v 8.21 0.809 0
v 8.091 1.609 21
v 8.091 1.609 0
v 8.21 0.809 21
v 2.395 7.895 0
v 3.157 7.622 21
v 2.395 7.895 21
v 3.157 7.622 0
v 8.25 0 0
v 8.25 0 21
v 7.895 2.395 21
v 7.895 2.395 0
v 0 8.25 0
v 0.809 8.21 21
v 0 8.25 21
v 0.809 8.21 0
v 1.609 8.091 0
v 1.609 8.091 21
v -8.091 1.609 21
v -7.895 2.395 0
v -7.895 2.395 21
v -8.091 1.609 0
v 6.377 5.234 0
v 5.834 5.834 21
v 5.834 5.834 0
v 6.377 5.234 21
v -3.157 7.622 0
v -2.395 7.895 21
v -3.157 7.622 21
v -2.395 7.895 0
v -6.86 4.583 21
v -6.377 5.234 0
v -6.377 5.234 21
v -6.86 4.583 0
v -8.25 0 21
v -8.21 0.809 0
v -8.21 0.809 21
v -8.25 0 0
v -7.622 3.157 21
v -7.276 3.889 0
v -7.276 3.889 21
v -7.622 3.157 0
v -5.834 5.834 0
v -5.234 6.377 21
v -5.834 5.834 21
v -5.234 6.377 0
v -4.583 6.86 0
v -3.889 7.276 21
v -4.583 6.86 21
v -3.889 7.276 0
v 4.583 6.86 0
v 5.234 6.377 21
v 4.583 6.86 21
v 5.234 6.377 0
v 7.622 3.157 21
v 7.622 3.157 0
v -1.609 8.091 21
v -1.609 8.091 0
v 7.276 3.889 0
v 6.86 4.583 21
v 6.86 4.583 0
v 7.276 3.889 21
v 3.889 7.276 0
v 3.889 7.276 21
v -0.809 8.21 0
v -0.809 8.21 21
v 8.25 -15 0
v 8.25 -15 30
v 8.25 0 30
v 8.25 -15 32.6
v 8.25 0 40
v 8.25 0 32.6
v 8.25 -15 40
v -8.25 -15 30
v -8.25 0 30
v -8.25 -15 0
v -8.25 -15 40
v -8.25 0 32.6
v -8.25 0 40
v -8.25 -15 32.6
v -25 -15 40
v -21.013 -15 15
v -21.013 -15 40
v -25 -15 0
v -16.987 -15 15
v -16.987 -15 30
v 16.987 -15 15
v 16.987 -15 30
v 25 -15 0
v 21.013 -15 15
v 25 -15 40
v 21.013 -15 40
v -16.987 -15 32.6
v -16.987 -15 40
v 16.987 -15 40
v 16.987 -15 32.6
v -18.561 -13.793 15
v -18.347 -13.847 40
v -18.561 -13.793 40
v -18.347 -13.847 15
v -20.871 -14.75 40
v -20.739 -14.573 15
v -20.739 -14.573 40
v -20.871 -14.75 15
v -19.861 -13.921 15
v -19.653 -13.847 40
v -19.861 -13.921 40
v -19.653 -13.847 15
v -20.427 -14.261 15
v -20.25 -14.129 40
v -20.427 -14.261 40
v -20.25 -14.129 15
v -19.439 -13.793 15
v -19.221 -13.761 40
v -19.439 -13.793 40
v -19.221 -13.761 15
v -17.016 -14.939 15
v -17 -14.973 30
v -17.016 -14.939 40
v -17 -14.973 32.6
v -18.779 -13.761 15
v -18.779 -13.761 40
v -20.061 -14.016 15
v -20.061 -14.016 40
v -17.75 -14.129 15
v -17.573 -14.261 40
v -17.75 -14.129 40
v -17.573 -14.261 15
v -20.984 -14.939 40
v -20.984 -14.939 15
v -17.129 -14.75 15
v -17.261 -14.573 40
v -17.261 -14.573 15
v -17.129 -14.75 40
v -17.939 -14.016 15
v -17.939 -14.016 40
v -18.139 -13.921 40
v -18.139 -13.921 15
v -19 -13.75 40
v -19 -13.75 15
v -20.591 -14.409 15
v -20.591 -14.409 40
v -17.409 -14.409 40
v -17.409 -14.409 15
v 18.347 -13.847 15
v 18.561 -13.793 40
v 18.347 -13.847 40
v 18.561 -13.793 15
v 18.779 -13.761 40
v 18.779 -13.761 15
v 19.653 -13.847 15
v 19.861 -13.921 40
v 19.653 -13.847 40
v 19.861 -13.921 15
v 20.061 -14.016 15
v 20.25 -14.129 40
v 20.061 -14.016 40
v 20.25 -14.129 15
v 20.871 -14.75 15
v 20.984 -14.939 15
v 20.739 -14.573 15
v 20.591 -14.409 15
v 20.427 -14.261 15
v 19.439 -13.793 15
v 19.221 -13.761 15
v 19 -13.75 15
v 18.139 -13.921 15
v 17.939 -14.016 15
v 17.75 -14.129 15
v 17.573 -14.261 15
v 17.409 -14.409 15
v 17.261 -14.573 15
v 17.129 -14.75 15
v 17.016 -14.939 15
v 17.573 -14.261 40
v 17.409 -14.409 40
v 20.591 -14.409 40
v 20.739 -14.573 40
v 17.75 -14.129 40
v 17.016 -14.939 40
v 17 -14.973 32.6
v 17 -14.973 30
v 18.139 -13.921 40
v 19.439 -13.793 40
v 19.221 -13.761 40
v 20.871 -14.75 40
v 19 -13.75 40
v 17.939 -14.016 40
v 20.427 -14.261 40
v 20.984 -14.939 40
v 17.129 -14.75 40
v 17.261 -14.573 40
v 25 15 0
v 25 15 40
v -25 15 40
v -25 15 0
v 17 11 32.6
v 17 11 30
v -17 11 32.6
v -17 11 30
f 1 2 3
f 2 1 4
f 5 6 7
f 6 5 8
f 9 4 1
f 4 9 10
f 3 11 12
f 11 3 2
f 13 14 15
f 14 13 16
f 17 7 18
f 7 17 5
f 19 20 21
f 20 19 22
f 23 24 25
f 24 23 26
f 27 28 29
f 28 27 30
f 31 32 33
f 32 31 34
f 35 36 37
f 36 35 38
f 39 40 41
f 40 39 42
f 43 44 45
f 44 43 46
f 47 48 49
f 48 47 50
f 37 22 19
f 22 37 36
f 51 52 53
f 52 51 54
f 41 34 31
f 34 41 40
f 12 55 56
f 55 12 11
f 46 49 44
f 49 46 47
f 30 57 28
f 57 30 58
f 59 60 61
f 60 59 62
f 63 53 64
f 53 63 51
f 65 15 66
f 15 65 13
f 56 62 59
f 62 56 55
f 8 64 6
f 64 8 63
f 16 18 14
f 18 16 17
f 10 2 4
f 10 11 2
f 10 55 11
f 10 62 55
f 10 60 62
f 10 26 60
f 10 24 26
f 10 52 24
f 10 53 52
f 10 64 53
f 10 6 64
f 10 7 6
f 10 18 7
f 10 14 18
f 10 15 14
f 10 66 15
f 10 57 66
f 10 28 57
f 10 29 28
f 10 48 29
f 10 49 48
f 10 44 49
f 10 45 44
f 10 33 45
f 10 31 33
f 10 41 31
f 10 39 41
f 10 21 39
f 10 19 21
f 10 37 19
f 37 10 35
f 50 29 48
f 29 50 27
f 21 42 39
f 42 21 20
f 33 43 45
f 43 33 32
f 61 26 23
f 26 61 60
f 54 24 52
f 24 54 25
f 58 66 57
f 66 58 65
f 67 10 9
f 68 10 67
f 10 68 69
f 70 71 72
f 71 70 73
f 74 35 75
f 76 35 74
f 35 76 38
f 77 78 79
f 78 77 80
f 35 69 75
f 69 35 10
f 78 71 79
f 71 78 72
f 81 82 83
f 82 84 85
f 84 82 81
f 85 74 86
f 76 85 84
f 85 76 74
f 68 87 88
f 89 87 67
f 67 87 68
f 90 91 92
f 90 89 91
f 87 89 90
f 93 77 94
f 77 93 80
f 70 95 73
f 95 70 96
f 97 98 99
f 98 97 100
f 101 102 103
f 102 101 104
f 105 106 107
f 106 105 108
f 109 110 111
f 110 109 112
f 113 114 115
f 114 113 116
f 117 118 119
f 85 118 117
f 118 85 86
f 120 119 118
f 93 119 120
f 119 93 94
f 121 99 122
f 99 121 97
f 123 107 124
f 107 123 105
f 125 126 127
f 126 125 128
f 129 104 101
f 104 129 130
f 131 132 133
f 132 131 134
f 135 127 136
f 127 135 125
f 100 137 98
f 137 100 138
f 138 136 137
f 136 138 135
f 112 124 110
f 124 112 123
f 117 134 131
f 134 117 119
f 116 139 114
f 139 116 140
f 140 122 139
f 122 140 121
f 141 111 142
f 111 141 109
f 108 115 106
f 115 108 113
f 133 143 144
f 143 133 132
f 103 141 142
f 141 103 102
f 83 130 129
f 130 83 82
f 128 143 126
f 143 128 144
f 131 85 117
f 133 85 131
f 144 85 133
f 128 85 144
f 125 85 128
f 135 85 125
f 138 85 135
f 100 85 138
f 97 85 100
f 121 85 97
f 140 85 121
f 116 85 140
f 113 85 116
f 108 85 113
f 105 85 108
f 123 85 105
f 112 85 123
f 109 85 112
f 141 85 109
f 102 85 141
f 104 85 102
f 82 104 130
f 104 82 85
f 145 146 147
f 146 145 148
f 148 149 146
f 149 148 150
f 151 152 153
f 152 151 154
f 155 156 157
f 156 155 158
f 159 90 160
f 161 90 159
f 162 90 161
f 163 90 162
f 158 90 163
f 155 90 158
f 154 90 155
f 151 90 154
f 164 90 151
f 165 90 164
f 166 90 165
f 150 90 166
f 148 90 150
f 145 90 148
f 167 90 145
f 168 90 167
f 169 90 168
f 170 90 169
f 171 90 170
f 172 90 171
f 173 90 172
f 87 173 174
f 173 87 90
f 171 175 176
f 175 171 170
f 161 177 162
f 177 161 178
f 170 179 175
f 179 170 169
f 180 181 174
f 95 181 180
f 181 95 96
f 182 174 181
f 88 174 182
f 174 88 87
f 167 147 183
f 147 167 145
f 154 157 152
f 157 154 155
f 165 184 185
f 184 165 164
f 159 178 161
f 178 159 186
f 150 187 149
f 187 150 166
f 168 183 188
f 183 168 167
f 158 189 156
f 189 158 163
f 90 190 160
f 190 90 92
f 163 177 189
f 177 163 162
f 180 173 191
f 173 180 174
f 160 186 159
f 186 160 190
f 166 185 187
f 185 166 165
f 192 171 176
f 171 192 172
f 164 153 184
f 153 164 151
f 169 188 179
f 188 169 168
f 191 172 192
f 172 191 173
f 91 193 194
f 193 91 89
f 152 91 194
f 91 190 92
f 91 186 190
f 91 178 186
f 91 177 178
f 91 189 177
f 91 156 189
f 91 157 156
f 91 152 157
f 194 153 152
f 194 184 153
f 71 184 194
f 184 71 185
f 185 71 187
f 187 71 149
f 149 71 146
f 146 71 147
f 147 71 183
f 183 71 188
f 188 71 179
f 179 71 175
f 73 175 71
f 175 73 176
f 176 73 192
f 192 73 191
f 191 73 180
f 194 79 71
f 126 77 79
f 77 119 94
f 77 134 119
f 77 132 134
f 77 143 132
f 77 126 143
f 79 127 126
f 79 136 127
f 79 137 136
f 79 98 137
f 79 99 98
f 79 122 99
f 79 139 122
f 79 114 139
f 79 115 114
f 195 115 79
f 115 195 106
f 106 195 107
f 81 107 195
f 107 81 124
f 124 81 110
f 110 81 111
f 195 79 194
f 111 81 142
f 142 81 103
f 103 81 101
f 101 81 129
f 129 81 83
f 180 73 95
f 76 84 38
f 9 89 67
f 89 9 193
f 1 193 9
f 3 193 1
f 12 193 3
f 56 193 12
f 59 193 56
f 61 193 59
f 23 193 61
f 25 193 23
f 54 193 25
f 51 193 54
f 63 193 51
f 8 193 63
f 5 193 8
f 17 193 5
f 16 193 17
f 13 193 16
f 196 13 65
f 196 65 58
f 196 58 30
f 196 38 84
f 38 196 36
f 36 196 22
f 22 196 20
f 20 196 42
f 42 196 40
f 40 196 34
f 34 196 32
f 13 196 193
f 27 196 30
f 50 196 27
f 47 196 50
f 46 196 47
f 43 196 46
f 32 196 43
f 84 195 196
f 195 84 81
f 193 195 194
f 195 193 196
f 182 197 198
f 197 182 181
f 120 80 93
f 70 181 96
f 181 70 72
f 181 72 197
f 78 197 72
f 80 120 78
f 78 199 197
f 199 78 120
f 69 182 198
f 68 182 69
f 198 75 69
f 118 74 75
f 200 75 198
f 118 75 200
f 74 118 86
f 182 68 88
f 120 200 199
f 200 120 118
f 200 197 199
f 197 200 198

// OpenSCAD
// Wall-mounted 10 mL syringe holder (tip-down, upright)
// Print orientation: rests on XY plane at z = 0, builds +Z, centred in X/Y.
// Back face (y = 15) is the wall side; syringe slides in from the front (y = -15).

// ---- Block dimensions (measured with calipers) ----
block_w = 50;   // X width
block_d = 30;   // Y depth
block_h = 40;   // Z height

// ---- Barrel channel (16.5 mm wide vertical slot, full height) ----
ch_half_w = 16.5 / 2;   // 8.25 mm half-width
ch_back_r = 8.25;       // radius of the half-circle at the back end
ch_back_cy = 0;         // centre of the back half-circle in Y (y = 0)
ch_front_y = -15;       // straight sides run forward to the front face

// ---- Finger-flange slot (cut in from the front face) ----
flange_w = 34;          // X width, centred
flange_h = 2.6;         // Z thickness (2 mm flange + clearance)
flange_z0 = 30;         // bottom of slot
flange_z1 = 32.6;       // top of slot
flange_y0 = -15;        // starts at the front face
flange_y1 = 11;         // extends back to y = 11

// ---- M4 wall-screw clearance holes (through, along Y) ----
screw_d = 4.5;          // clearance hole diameter
screw_z = 15;           // hole centre height
screw_x = [-19, 19];    // hole centre X positions

// ---- Curvature resolution ----
$fn = 64;

// =====================================================================
// 1. Base block, centred on origin in X and Y, sitting on z = 0
// =====================================================================
module block() { translate([-block_w / 2, -block_d / 2, 0])
    cube([block_w, block_d, block_h]); }

// =====================================================================
// 2. Barrel channel: half-circle (back) + rectangle (forward to front)
//    Union of the two pieces gives a smooth "D" cross-section.
//    Both pieces extend 1 mm past the top/bottom faces so the cut is
//    clean and no faces end up exactly coplanar with the block.
// =====================================================================
// 2a. Half-circle at the back (y >= 0), spanning x = -8.25 .. 8.25
module half_circle() { translate([0, ch_back_cy, 0])
    linear_extrude(height = block_h + 2, center = true)
        circle(r = ch_back_r, $fn = 64); }

// 2b. Rectangle from y = 0 back to the front face (y = -15)
module channel_rect() { translate([-ch_half_w, ch_front_y, -1])
    cube([2 * ch_half_w, -ch_front_y, block_h + 2]); }   // y: -15 .. 0

module barrel_channel() { union() {
    half_circle();
    channel_rect();
} }

// =====================================================================
// 3. Finger-flange slot: 34 mm wide, 2.6 mm tall, y = -15 .. 11
//    (extends 1 mm past the front face so the cut is not coplanar)
// =====================================================================
module flange_slot() { translate([-flange_w / 2, flange_y0 - 1, flange_z0])
    cube([flange_w, flange_y1 - flange_y0 + 1, flange_h]); }

// =====================================================================
// 4. M4 screw clearance holes: 4.5 mm dia, through along Y
//    (extend 1 mm past both the front and back faces)
// =====================================================================
module screw_holes() { for (sx = screw_x)
    translate([sx, -block_d / 2 - 1, screw_z])
        cylinder(h = block_d + 2, r = screw_d / 2, $fn = 64); }

// =====================================================================
// Final part: block minus all cutters
// =====================================================================
difference() {
    block();
    barrel_channel();
    flange_slot();
    screw_holes();
}
